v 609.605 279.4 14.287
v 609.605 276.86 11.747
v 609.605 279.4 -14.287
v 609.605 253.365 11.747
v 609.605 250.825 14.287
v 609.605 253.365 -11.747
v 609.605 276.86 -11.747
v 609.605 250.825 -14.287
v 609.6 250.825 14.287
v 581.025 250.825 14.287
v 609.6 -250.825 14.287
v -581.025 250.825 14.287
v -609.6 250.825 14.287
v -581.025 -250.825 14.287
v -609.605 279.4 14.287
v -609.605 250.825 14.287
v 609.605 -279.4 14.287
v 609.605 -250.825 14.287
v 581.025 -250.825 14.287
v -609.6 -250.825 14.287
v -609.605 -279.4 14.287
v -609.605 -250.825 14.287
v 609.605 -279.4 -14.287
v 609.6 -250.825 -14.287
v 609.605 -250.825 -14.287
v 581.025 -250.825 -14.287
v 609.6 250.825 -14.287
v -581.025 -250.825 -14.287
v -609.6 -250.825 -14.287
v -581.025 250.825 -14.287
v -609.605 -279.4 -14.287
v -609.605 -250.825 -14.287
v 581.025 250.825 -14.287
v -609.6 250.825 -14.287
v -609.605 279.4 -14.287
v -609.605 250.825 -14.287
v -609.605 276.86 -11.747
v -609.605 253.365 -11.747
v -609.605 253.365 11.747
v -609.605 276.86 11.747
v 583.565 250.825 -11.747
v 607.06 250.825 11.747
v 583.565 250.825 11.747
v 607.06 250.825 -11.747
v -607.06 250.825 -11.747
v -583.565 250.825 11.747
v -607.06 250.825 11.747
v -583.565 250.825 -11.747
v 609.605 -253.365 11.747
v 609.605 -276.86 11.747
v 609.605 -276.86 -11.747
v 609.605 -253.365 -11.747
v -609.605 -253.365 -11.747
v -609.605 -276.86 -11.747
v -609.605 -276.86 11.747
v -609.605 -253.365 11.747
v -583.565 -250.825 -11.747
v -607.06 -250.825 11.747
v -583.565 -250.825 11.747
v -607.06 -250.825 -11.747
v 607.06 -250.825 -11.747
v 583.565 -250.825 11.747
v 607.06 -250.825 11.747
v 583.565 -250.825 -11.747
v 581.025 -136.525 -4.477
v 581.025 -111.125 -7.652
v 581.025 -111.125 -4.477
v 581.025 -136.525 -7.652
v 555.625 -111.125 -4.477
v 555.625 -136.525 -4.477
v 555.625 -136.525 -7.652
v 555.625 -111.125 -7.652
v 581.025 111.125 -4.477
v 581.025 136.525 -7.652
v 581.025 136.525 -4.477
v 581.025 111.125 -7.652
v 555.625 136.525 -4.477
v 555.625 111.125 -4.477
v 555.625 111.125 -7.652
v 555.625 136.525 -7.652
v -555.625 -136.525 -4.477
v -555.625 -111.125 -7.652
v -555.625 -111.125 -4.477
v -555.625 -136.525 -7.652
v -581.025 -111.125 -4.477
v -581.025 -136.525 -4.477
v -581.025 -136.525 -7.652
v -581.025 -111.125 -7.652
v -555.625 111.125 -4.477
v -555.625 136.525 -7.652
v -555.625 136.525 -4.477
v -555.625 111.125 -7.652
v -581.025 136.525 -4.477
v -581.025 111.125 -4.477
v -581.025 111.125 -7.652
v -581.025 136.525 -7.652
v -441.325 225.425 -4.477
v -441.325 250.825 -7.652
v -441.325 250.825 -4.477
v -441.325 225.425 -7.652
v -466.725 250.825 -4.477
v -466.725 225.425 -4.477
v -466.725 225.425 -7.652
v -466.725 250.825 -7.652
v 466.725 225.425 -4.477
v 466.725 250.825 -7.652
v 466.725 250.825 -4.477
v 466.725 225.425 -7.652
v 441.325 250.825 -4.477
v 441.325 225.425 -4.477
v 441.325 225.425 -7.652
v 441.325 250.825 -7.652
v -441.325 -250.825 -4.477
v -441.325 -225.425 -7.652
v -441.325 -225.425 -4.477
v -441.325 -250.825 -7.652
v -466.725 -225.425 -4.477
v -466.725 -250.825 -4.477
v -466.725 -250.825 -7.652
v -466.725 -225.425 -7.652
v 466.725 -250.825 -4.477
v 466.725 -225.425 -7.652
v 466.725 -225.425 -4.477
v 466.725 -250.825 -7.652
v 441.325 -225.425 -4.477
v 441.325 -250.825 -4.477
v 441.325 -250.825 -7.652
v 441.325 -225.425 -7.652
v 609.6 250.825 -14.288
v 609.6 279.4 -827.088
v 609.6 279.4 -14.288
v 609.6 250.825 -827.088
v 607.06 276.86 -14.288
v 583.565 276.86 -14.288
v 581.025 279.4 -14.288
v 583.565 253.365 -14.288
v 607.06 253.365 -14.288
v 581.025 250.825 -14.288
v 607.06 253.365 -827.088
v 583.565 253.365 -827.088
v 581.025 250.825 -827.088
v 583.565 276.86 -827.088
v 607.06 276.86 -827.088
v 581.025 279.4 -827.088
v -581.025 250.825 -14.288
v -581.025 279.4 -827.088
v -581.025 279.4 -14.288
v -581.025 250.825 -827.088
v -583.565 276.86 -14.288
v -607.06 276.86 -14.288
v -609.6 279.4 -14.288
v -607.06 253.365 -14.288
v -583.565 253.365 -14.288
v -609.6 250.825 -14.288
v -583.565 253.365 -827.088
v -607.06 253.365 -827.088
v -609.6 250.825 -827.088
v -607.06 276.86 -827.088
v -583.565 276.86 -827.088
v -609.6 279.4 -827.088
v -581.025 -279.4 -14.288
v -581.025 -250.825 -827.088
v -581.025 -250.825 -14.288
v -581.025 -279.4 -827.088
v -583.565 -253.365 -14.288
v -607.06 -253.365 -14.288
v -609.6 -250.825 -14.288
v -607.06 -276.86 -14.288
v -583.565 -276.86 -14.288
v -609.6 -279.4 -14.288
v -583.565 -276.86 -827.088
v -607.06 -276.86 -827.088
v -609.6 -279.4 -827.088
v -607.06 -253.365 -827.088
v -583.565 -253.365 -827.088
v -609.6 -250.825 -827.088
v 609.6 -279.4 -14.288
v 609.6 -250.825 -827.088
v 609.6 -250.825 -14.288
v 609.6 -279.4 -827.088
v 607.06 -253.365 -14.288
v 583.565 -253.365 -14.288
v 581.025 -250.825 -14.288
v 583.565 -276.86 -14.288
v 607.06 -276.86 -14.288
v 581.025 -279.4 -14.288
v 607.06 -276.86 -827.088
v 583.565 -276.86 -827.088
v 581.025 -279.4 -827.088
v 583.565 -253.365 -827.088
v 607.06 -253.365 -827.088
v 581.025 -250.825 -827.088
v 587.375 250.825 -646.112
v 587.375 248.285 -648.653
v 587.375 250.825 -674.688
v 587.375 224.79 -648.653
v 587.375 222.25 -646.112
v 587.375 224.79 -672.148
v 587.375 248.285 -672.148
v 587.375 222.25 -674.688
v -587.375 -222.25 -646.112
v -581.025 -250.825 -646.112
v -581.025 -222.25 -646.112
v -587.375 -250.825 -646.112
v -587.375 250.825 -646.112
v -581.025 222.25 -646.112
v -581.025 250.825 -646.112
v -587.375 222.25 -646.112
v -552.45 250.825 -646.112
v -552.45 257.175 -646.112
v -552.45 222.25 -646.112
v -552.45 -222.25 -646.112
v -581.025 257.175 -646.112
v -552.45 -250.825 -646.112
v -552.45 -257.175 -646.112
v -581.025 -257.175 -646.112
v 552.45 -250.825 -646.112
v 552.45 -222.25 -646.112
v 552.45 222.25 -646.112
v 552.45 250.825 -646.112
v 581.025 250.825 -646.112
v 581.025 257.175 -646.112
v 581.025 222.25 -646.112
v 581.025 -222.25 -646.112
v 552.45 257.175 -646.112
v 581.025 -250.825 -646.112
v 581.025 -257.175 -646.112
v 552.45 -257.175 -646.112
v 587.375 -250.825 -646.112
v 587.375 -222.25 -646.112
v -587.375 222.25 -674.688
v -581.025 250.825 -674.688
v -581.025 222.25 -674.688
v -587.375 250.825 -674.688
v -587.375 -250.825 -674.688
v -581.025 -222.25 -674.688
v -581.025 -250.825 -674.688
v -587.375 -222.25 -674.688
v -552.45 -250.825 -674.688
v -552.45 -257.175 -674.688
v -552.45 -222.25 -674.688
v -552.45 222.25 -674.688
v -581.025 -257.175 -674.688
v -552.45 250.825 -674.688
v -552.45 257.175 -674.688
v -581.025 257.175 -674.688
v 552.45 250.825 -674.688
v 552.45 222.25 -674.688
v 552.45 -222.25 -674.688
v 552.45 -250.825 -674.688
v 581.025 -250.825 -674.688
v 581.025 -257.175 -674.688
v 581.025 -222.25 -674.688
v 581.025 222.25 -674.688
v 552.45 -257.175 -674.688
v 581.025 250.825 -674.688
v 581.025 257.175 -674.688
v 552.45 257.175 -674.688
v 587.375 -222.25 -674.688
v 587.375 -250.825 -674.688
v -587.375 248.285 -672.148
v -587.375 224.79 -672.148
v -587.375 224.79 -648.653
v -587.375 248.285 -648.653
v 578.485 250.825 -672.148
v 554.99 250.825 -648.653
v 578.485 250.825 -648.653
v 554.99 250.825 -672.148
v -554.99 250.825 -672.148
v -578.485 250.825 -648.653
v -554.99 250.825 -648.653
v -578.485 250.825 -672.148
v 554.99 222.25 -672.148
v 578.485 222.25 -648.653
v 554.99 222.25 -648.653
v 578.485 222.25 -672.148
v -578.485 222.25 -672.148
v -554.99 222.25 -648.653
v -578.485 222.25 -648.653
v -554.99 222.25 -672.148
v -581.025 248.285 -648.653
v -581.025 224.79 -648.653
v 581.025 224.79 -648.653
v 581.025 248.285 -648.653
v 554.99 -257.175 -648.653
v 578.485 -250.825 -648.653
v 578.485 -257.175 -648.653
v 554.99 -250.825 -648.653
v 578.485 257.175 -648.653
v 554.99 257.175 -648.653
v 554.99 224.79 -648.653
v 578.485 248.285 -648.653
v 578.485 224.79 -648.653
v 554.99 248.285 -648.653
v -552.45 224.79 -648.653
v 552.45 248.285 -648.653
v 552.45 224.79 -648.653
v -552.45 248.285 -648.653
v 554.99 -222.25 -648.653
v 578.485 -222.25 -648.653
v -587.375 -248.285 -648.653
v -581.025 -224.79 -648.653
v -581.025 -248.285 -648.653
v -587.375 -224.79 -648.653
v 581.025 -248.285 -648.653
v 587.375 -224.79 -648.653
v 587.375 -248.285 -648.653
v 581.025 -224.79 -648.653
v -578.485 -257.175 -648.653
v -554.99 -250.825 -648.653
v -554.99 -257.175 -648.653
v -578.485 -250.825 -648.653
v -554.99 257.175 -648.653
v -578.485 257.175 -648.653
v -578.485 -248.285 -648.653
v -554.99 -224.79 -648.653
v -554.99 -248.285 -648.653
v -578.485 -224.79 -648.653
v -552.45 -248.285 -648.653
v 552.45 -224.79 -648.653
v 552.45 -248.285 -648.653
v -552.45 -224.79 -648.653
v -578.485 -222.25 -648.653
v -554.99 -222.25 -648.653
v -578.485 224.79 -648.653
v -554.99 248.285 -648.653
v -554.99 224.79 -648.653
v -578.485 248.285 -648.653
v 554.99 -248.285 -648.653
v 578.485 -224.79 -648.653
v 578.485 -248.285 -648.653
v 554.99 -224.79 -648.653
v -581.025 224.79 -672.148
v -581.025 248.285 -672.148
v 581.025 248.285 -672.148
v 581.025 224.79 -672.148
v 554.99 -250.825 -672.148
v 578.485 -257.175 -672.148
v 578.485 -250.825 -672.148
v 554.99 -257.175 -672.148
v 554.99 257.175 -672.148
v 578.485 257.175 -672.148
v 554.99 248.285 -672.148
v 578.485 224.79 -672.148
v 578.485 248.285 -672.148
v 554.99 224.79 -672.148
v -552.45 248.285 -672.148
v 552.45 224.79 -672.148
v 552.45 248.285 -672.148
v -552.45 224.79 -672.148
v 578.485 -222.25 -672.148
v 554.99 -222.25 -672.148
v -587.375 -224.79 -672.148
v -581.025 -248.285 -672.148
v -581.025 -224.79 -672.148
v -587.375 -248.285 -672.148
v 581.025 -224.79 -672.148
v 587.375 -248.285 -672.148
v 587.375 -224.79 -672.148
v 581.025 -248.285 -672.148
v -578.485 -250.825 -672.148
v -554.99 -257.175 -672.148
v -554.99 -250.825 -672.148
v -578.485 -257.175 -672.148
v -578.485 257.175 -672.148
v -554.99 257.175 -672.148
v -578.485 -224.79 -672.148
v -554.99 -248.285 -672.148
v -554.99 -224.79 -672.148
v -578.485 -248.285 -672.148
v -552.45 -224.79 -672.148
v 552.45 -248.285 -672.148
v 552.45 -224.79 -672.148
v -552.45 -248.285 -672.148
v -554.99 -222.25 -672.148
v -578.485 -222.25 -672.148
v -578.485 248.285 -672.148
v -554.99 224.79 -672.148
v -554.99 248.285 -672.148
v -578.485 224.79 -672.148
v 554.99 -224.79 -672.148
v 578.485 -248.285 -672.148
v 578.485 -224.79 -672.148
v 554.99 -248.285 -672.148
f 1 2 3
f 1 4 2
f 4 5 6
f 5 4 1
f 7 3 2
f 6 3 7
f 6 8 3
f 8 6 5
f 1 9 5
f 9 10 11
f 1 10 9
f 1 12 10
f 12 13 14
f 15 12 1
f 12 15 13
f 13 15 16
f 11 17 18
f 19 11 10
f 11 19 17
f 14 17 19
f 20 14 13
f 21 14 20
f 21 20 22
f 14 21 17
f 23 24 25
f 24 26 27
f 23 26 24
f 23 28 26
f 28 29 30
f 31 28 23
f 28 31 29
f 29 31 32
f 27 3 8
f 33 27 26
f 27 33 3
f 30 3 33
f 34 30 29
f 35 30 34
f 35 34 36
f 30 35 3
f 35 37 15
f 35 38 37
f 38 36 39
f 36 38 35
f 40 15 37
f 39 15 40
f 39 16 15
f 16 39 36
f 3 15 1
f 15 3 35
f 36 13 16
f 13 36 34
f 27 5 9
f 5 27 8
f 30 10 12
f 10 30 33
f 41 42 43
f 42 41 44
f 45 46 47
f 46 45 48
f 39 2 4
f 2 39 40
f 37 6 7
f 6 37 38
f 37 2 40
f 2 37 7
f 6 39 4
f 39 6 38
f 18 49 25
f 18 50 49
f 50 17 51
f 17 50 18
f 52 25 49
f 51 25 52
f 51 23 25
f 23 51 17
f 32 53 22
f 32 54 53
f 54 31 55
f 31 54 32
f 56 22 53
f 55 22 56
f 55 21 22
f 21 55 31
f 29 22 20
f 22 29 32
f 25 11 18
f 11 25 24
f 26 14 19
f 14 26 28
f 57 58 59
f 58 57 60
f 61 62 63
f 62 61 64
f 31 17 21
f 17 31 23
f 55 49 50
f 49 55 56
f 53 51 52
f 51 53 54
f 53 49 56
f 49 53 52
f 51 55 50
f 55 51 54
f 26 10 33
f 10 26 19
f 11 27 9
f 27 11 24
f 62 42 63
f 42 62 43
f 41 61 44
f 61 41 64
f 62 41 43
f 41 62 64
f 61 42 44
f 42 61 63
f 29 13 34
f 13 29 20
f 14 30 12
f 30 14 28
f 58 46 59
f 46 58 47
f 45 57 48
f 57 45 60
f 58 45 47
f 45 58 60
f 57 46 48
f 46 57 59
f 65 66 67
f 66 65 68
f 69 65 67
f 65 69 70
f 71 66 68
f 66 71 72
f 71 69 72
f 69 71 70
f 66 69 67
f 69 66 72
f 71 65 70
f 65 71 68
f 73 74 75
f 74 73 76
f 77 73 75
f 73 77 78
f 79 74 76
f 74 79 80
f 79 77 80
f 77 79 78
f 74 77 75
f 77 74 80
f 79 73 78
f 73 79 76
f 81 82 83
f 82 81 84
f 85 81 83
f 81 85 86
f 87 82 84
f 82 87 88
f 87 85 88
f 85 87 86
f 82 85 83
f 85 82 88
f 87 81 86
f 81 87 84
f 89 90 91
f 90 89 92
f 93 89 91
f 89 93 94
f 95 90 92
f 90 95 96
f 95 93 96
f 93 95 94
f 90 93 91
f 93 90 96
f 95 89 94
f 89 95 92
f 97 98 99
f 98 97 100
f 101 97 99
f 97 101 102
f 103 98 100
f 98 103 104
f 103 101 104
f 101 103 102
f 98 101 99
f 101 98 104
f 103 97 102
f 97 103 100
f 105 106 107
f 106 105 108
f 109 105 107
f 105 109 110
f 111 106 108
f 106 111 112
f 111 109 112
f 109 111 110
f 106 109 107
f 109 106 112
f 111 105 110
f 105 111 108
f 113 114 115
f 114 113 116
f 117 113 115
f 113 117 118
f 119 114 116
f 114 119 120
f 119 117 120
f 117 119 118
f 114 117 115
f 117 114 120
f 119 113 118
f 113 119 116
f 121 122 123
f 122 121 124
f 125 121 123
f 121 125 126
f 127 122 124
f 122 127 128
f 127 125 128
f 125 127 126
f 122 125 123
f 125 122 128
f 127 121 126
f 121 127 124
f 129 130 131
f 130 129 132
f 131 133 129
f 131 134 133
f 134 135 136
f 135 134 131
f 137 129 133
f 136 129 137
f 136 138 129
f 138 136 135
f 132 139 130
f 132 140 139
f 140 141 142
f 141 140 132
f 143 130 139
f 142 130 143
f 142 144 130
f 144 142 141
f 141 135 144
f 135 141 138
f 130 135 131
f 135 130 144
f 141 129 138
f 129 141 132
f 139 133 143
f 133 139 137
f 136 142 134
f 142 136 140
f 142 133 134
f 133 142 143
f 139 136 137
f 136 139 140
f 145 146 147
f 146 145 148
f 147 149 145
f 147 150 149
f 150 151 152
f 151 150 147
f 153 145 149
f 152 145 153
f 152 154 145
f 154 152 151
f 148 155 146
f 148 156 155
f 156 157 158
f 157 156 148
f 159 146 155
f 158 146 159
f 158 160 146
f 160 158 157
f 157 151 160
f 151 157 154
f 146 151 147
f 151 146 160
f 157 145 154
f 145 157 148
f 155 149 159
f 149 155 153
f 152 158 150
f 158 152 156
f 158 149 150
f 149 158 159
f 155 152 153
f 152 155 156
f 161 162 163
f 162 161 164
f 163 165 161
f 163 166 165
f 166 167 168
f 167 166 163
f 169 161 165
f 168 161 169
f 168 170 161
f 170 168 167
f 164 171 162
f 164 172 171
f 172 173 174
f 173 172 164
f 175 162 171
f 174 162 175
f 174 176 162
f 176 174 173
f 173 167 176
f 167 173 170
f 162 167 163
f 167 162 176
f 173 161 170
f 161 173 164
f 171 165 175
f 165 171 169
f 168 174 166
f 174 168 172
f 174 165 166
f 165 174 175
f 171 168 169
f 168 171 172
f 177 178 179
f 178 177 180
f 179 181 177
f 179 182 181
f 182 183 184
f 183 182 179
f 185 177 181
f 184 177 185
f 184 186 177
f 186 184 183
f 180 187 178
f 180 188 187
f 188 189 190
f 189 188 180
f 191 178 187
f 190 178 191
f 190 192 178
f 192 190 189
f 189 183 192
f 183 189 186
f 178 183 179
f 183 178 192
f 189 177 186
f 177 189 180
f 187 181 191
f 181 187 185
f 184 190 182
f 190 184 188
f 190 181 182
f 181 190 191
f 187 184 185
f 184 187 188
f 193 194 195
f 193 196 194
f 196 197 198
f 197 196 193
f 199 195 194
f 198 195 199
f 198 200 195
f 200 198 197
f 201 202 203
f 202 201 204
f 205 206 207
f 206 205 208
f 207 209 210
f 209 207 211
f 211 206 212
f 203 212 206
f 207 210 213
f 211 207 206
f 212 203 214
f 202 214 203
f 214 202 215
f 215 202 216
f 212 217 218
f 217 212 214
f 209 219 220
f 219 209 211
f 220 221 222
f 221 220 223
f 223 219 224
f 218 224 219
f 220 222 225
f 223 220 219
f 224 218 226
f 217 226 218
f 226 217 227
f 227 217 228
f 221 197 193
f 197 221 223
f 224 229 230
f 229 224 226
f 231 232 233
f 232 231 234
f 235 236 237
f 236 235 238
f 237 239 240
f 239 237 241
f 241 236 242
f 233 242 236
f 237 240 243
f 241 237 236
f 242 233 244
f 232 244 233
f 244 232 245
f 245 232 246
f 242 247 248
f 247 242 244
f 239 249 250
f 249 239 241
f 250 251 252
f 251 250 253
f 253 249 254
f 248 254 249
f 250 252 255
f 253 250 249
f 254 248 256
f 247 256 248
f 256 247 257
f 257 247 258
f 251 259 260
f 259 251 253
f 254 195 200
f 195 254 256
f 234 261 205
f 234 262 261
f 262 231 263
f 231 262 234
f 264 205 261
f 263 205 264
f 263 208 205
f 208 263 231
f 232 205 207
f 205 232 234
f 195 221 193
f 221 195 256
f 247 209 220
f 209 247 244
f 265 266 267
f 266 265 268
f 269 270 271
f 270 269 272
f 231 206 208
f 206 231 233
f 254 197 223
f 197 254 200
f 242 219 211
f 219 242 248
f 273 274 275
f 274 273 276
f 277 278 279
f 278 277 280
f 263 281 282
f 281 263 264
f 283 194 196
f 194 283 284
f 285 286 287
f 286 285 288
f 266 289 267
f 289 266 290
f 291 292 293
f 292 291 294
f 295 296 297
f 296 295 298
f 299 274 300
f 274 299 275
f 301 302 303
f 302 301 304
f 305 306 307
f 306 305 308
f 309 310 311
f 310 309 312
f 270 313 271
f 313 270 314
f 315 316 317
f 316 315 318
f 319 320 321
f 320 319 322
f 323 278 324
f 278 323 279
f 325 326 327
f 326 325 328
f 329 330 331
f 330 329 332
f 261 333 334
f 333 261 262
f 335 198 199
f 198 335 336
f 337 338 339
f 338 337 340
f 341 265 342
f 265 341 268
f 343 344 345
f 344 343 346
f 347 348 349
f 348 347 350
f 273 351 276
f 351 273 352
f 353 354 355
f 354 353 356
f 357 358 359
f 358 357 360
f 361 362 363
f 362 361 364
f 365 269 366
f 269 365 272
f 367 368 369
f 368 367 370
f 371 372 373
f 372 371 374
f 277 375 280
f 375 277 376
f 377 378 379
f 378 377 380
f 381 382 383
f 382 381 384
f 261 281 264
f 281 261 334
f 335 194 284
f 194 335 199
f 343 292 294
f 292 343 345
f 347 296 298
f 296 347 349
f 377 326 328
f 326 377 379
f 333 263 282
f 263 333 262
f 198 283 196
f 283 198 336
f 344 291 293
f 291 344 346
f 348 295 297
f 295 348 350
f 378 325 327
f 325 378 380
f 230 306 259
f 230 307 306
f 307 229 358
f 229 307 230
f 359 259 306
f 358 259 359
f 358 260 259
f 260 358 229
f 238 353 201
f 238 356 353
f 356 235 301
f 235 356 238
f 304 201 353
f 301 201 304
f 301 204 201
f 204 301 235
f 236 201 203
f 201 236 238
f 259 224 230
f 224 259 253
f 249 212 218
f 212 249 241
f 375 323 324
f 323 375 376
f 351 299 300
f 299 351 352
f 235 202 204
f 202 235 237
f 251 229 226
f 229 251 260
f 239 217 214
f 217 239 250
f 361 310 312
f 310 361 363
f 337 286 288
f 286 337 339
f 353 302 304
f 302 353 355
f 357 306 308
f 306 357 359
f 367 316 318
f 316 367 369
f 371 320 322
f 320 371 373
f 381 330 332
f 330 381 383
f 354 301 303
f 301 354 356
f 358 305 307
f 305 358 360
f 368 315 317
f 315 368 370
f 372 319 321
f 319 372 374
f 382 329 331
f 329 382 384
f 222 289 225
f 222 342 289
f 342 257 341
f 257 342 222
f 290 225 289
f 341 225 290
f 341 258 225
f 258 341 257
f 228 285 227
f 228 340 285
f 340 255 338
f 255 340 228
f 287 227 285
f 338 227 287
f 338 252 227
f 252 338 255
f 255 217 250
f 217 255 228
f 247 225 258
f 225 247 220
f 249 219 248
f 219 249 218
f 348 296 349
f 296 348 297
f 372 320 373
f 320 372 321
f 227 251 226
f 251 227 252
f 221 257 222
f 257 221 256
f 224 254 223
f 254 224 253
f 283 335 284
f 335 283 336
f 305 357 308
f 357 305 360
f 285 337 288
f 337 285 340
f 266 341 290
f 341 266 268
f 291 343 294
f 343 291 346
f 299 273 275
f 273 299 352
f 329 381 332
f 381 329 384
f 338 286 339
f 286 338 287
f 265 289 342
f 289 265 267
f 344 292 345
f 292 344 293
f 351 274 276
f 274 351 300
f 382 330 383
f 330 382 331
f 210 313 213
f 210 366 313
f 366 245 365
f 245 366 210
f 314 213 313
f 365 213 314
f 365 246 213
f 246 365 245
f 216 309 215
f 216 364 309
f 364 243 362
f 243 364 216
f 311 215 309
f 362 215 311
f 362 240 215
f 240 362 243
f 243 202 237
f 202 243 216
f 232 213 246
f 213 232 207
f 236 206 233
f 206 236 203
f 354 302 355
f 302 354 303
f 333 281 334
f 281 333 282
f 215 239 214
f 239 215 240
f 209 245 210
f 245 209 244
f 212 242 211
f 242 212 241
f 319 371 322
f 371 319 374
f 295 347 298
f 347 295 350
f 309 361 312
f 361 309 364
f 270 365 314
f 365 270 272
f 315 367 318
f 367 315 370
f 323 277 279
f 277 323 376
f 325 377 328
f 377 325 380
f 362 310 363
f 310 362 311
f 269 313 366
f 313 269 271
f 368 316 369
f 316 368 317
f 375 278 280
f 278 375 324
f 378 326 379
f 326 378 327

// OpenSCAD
//
// Rectangular/Square Welded Table Frame – OpenSCAD (FreeCAD‑friendly)
// - 1.125" square tubing (wall param), butt joints
// - Plywood support tabs: 1" x 1" x tab_thk, 2 per side @ 5" from each end
// - Legs 32" long
// - Perimeter stretchers with end overlap into legs
// - BOM echo block with lengths and weight
// Author: M365 Copilot (for Kevin Gordon)
//

unit = 25.4;                      // mm per inch (set to 1 for inch-native display)
function U(x) = x * unit;

eps = 0.01;                       // small overlap (mm) for boolean stability
$fa = 2; $fs = 0.5;

// ---------------- Parameters ----------------

// Size (outside dimensions)
outer_x_in = 48;                  // X (width/long direction); set equal to Y for square
outer_y_in = 22;                  // Y (depth/short direction)

// Tube spec
tube_od_in = 1.125;               // outside dimension of square tube
wall_in    = 0.100;               // wall thickness (e.g., 0.100 or 0.125)

// Legs
add_legs   = true;
leg_len_in = 32.0;

// Stretchers (perimeter between legs)
add_stretchers                 = true;
stretcher_bottom_from_floor_in = 6.0;   // bottom of stretcher above floor
stretcher_gap_in               = 0.00;  // length relief (each rail loses 2*gap total)
stretcher_attach_overlap_in    = 0.25;  // each end penetrates into leg by this amount

// Plywood & tabs (support ledges)
add_tabs          = true;
ply_thick_in      = 23/32;              // 0.71875 typical 3/4" plywood
ply_clear_in      = 0.02;               // vertical install clearance
recess_in         = 0.00;               // 0 = flush top; set 0.125 to recess 1/8"

tab_len_in        = 1.00;               // 1" along side
tab_depth_in      = 1.00;               // 1" inward
tab_thk_in        = 0.125;              // 1/8" tabs (set 0.100 if matching .100" wall)
tab_edge_margin_in = 5.00;              // centers 5" from each end; exactly 2 tabs per side

tabs_with_holes   = false;              // optional screw holes in tabs
hole_dia_in       = 0.188;              // ~3/16"
hole_inset_in     = 0.50;               // hole center from wall (0.5" centers in 1"-deep tab)

// BOM / weight echo
do_bom_echo             = true;
material_name           = "Steel";       // label only
material_density_lb_in3 = 0.283;         // Steel ~0.283, Aluminum ~0.0975

// ---------------- Derived (model units) ----------------

tube_od  = U(tube_od_in);
wall     = U(wall_in);

outer_x  = U(outer_x_in);
outer_y  = U(outer_y_in);
inner_x  = outer_x - 2 * tube_od;
inner_y  = outer_y - 2 * tube_od;

leg_len  = U(leg_len_in);

stretcher_bottom_from_floor = U(stretcher_bottom_from_floor_in);
stretcher_gap               = U(stretcher_gap_in);
stretcher_attach_overlap    = U(stretcher_attach_overlap_in);

ply_thick = U(ply_thick_in);
ply_clear = U(ply_clear_in);
recess    = U(recess_in);

tab_len   = U(tab_len_in);
tab_depth = U(tab_depth_in);
tab_thk   = U(tab_thk_in);
tab_margin = U(tab_edge_margin_in);

hole_dia  = U(hole_dia_in);
hole_inset = U(hole_inset_in);

// ---------------- Geometry Modules ----------------

// Hollow square tube along X
module square_tube_x(L, od=tube_od, w=wall) {
    difference() {
        translate([-L/2, -od/2, -od/2]) cube([L, od, od], center=false);
        // hollow
        translate([-L/2 - eps, -(od/2 - w), -(od/2 - w)])
            cube([L + 2*eps, od - 2*w, od - 2*w], center=false);
    }
}

// Hollow square tube along Z; TOP at z=0; extends downward by L
module square_tube_z(L, od=tube_od, w=wall) {
    difference() {
        translate([-od/2, -od/2, -L]) cube([od, od, L], center=false);
        translate([-(od/2 - w), -(od/2 - w), -L - eps])
            cube([od - 2*w, od - 2*w, L + 2*eps], center=false);
    }
}

// Rectangular butt-jointed frame (two X rails full length, two Y rails between)
module frame_rect(ox=outer_x, oy=outer_y, od=tube_od, w=wall, gap=0) {
    // X rails (full outer_x) at ±Y
    translate([0,  (oy/2 - od/2), 0]) square_tube_x(ox + eps, od, w);
    translate([0, -(oy/2 - od/2), 0]) square_tube_x(ox + eps, od, w);

    // Y rails (length outer_y - 2*od) at ±X
    Ly = oy - 2*od - gap;
    translate([ (ox/2 - od/2), 0, 0]) rotate([0,0,90]) square_tube_x(Ly + eps, od, w);
    translate([-(ox/2 - od/2), 0, 0]) rotate([0,0,90]) square_tube_x(Ly + eps, od, w);
}

// Four legs at outer corners; top of leg flush to frame bottom (z = -od/2)
module legs_four_rect(ox=outer_x, oy=outer_y, od=tube_od, L=leg_len) {
    cx = ox/2 - od/2;
    cy = oy/2 - od/2;
    translate([ +cx, +cy, -od/2 ]) square_tube_z(L, od);
    translate([ -cx, +cy, -od/2 ]) square_tube_z(L, od);
    translate([ -cx, -cy, -od/2 ]) square_tube_z(L, od);
    translate([ +cx, -cy, -od/2 ]) square_tube_z(L, od);
}

// Perimeter stretchers with end overlap into legs
module stretchers_perimeter_rect(ox=outer_x, oy=outer_y, od=tube_od, w=wall,
                                 legL=leg_len,
                                 bottom_from_floor=stretcher_bottom_from_floor,
                                 end_gap=stretcher_gap,
                                 end_overlap=stretcher_attach_overlap) {
    // Leg bottom and stretcher Z
    z_leg_bottom = -od/2 - legL;
    z_bottom     =  z_leg_bottom + bottom_from_floor;
    z_center     =  z_bottom + od/2;

    // Inner spans
    inner_span_x = ox - 2*od;
    inner_span_y = oy - 2*od;

    // Rail lengths (embed into legs)
    Lx = inner_span_x - 2*end_gap + 2*end_overlap;
    Ly = inner_span_y - 2*end_gap + 2*end_overlap;

    // Offsets so stretcher OUTER face is co-planar with leg INNER face plane
    offY = oy/2 - 1.5*od;   // for X-running rails (front/back)
    offX = ox/2 - 1.5*od;   // for Y-running rails (left/right)

    // Front (+Y), Back (−Y)
    translate([ 0, +offY, z_center ]) square_tube_x(Lx, od, w);
    translate([ 0, -offY, z_center ]) square_tube_x(Lx, od, w);

    // Right (+X), Left (−X)
    translate([ +offX, 0, z_center ]) rotate([0,0,90]) square_tube_x(Ly, od, w);
    translate([ -offX, 0, z_center ]) rotate([0,0,90]) square_tube_x(Ly, od, w);
}

// Tabs: 2 per side, centers 5" from each end (rectangular-aware), plus optional holes
module tabs_rect_all_sides(ix=inner_x, iy=inner_y, od=tube_od) {
    if (add_tabs) {
        // Vertical placement: top of tabs meets plywood underside
        z_top =  +od/2 - recess - ply_thick - ply_clear;
        z0    =  z_top - tab_thk;

        // Centers ±(span/2 − margin)
        px = ix/2 - tab_margin;   // along X for top/bottom sides
        py = iy/2 - tab_margin;   // along Y for left/right sides

        // Right wall (+X): extend −X
        translate([ +ix/2 - tab_depth, -py - tab_len/2, z0 ]) cube([ tab_depth, tab_len, tab_thk ], center=false);
        translate([ +ix/2 - tab_depth, +py - tab_len/2, z0 ]) cube([ tab_depth, tab_len, tab_thk ], center=false);

        // Left wall (−X): extend +X
        translate([ -ix/2, -py - tab_len/2, z0 ]) cube([ tab_depth, tab_len, tab_thk ], center=false);
        translate([ -ix/2, +py - tab_len/2, z0 ]) cube([ tab_depth, tab_len, tab_thk ], center=false);

        // Top wall (+Y): extend −Y
        translate([ -px - tab_len/2, +iy/2 - tab_depth, z0 ]) cube([ tab_len, tab_depth, tab_thk ], center=false);
        translate([ +px - tab_len/2, +iy/2 - tab_depth, z0 ]) cube([ tab_len, tab_depth, tab_thk ], center=false);

        // Bottom wall (−Y): extend +Y
        translate([ -px - tab_len/2, -iy/2, z0 ]) cube([ tab_len, tab_depth, tab_thk ], center=false);
        translate([ +px - tab_len/2, -iy/2, z0 ]) cube([ tab_len, tab_depth, tab_thk ], center=false);
    }
}

module tab_holes_rect(ix=inner_x, iy=inner_y, od=tube_od) {
    if (add_tabs && tabs_with_holes) {
        z_top =  +od/2 - recess - ply_thick - ply_clear;
        z0    =  z_top - tab_thk;

        px = ix/2 - tab_margin;
        py = iy/2 - tab_margin;

        // Right/Left (vary Y)
        translate([ +ix/2 - hole_inset, -py, z0 - eps ]) cylinder(h = tab_thk + 2*eps, d = hole_dia, center=false, $fn=48);
        translate([ +ix/2 - hole_inset, +py, z0 - eps ]) cylinder(h = tab_thk + 2*eps, d = hole_dia, center=false, $fn=48);
        translate([ -ix/2 + hole_inset, -py, z0 - eps ]) cylinder(h = tab_thk + 2*eps, d = hole_dia, center=false, $fn=48);
        translate([ -ix/2 + hole_inset, +py, z0 - eps ]) cylinder(h = tab_thk + 2*eps, d = hole_dia, center=false, $fn=48);

        // Top/Bottom (vary X)
        translate([ -px, +iy/2 - hole_inset, z0 - eps ]) cylinder(h = tab_thk + 2*eps, d = hole_dia, center=false, $fn=48);
        translate([ +px, +iy/2 - hole_inset, z0 - eps ]) cylinder(h = tab_thk + 2*eps, d = hole_dia, center=false, $fn=48);
        translate([ -px, -iy/2 + hole_inset, z0 - eps ]) cylinder(h = tab_thk + 2*eps, d = hole_dia, center=false, $fn=48);
        translate([ +px, -iy/2 + hole_inset, z0 - eps ]) cylinder(h = tab_thk + 2*eps, d = hole_dia, center=false, $fn=48);
    }
}

// ---------------- Top-level CSG ----------------

render() difference() {
    union() {
        // Frame
        frame_rect(outer_x, outer_y, tube_od, wall, 0);

        // Tabs
        tabs_rect_all_sides(inner_x, inner_y, tube_od);

        // Legs
        if (add_legs) legs_four_rect(outer_x, outer_y, tube_od, leg_len);

        // Stretchers
        if (add_stretchers)
            stretchers_perimeter_rect(outer_x, outer_y, tube_od, wall,
                                      leg_len,
                                      stretcher_bottom_from_floor,
                                      stretcher_gap,
                                      stretcher_attach_overlap);
    }
    // Tab holes (optional)
    tab_holes_rect(inner_x, inner_y, tube_od);
}

// ---------------- BOM / Weight Echo ----------------

if (do_bom_echo) {
    // Per-piece lengths in inches
    frame_long_len_in = outer_x_in;
    frame_short_len_in = outer_y_in - 2 * tube_od_in;
    stretcher_x_len_in = (outer_x_in - 2 * tube_od_in) - 2*stretcher_gap_in + 2*stretcher_attach_overlap_in;
    stretcher_y_len_in = (outer_y_in - 2 * tube_od_in) - 2*stretcher_gap_in + 2*stretcher_attach_overlap_in;

    // Quantities
    q_frame_long = 2;
    q_frame_short = 2;
    q_leg = 4;
    q_stretch_x = 2;
    q_stretch_y = 2;
    q_tabs = 8;

    // Cross-section area (in^2) for hollow square tube
    inner_side_in = tube_od_in - 2*wall_in;
    xsec_area_in2 = tube_od_in*tube_od_in - inner_side_in*inner_side_in;

    // Total lengths (in)
    total_len_in = q_frame_long*frame_long_len_in +
                   q_frame_short*frame_short_len_in +
                   q_leg*leg_len_in +
                   q_stretch_x*stretcher_x_len_in +
                   q_stretch_y*stretcher_y_len_in;

    // Tube weight (lb)
    tube_weight_lb = xsec_area_in2 * total_len_in * material_density_lb_in3;

    // Tabs weight (lb)
    tab_vol_in3 = 1.0 * 1.0 * tab_thk_in;   // each 1" x 1" x tab_thk
    tabs_weight_lb = q_tabs * tab_vol_in3 * material_density_lb_in3;

    total_weight_lb = tube_weight_lb + tabs_weight_lb;

    // Echo in CSV-like lines
    echo(str("BOM, material=", material_name, ", density_lb_in3=", material_density_lb_in3));
    echo(str("BOM, frame_long, qty=", q_frame_long, ", len_in=", frame_long_len_in, ", stock=1.125x", wall_in, " sq tube"));
    echo(str("BOM, frame_short, qty=", q_frame_short, ", len_in=", frame_short_len_in, ", stock=1.125x", wall_in, " sq tube"));
    echo(str("BOM, leg, qty=", q_leg, ", len_in=", leg_len_in, ", stock=1.125x", wall_in, " sq tube"));
    echo(str("BOM, stretcher_x, qty=", q_stretch_x, ", len_in=", stretcher_x_len_in, ", stock=1.125x", wall_in, " sq tube"));
    echo(str("BOM, stretcher_y, qty=", q_stretch_y, ", len_in=", stretcher_y_len_in, ", stock=1.125x", wall_in, " sq tube"));
    echo(str("BOM, tabs, qty=", q_tabs, ", size_in=1x1x", tab_thk_in));

    echo(str("BOM_TOTAL, tube_len_in=", total_len_in, ", tube_len_ft=", total_len_in/12.0));
    echo(str("BOM_TOTAL, tube_weight_lb=", tube_weight_lb, ", tabs_weight_lb=", tabs_weight_lb, ", total_weight_lb=", total_weight_lb));

    // Helpful sanity echoes
    echo(str("INFO, inner_opening_x_in=", (inner_x/25.4), ", inner_opening_y_in=", (inner_y/25.4)));
}
